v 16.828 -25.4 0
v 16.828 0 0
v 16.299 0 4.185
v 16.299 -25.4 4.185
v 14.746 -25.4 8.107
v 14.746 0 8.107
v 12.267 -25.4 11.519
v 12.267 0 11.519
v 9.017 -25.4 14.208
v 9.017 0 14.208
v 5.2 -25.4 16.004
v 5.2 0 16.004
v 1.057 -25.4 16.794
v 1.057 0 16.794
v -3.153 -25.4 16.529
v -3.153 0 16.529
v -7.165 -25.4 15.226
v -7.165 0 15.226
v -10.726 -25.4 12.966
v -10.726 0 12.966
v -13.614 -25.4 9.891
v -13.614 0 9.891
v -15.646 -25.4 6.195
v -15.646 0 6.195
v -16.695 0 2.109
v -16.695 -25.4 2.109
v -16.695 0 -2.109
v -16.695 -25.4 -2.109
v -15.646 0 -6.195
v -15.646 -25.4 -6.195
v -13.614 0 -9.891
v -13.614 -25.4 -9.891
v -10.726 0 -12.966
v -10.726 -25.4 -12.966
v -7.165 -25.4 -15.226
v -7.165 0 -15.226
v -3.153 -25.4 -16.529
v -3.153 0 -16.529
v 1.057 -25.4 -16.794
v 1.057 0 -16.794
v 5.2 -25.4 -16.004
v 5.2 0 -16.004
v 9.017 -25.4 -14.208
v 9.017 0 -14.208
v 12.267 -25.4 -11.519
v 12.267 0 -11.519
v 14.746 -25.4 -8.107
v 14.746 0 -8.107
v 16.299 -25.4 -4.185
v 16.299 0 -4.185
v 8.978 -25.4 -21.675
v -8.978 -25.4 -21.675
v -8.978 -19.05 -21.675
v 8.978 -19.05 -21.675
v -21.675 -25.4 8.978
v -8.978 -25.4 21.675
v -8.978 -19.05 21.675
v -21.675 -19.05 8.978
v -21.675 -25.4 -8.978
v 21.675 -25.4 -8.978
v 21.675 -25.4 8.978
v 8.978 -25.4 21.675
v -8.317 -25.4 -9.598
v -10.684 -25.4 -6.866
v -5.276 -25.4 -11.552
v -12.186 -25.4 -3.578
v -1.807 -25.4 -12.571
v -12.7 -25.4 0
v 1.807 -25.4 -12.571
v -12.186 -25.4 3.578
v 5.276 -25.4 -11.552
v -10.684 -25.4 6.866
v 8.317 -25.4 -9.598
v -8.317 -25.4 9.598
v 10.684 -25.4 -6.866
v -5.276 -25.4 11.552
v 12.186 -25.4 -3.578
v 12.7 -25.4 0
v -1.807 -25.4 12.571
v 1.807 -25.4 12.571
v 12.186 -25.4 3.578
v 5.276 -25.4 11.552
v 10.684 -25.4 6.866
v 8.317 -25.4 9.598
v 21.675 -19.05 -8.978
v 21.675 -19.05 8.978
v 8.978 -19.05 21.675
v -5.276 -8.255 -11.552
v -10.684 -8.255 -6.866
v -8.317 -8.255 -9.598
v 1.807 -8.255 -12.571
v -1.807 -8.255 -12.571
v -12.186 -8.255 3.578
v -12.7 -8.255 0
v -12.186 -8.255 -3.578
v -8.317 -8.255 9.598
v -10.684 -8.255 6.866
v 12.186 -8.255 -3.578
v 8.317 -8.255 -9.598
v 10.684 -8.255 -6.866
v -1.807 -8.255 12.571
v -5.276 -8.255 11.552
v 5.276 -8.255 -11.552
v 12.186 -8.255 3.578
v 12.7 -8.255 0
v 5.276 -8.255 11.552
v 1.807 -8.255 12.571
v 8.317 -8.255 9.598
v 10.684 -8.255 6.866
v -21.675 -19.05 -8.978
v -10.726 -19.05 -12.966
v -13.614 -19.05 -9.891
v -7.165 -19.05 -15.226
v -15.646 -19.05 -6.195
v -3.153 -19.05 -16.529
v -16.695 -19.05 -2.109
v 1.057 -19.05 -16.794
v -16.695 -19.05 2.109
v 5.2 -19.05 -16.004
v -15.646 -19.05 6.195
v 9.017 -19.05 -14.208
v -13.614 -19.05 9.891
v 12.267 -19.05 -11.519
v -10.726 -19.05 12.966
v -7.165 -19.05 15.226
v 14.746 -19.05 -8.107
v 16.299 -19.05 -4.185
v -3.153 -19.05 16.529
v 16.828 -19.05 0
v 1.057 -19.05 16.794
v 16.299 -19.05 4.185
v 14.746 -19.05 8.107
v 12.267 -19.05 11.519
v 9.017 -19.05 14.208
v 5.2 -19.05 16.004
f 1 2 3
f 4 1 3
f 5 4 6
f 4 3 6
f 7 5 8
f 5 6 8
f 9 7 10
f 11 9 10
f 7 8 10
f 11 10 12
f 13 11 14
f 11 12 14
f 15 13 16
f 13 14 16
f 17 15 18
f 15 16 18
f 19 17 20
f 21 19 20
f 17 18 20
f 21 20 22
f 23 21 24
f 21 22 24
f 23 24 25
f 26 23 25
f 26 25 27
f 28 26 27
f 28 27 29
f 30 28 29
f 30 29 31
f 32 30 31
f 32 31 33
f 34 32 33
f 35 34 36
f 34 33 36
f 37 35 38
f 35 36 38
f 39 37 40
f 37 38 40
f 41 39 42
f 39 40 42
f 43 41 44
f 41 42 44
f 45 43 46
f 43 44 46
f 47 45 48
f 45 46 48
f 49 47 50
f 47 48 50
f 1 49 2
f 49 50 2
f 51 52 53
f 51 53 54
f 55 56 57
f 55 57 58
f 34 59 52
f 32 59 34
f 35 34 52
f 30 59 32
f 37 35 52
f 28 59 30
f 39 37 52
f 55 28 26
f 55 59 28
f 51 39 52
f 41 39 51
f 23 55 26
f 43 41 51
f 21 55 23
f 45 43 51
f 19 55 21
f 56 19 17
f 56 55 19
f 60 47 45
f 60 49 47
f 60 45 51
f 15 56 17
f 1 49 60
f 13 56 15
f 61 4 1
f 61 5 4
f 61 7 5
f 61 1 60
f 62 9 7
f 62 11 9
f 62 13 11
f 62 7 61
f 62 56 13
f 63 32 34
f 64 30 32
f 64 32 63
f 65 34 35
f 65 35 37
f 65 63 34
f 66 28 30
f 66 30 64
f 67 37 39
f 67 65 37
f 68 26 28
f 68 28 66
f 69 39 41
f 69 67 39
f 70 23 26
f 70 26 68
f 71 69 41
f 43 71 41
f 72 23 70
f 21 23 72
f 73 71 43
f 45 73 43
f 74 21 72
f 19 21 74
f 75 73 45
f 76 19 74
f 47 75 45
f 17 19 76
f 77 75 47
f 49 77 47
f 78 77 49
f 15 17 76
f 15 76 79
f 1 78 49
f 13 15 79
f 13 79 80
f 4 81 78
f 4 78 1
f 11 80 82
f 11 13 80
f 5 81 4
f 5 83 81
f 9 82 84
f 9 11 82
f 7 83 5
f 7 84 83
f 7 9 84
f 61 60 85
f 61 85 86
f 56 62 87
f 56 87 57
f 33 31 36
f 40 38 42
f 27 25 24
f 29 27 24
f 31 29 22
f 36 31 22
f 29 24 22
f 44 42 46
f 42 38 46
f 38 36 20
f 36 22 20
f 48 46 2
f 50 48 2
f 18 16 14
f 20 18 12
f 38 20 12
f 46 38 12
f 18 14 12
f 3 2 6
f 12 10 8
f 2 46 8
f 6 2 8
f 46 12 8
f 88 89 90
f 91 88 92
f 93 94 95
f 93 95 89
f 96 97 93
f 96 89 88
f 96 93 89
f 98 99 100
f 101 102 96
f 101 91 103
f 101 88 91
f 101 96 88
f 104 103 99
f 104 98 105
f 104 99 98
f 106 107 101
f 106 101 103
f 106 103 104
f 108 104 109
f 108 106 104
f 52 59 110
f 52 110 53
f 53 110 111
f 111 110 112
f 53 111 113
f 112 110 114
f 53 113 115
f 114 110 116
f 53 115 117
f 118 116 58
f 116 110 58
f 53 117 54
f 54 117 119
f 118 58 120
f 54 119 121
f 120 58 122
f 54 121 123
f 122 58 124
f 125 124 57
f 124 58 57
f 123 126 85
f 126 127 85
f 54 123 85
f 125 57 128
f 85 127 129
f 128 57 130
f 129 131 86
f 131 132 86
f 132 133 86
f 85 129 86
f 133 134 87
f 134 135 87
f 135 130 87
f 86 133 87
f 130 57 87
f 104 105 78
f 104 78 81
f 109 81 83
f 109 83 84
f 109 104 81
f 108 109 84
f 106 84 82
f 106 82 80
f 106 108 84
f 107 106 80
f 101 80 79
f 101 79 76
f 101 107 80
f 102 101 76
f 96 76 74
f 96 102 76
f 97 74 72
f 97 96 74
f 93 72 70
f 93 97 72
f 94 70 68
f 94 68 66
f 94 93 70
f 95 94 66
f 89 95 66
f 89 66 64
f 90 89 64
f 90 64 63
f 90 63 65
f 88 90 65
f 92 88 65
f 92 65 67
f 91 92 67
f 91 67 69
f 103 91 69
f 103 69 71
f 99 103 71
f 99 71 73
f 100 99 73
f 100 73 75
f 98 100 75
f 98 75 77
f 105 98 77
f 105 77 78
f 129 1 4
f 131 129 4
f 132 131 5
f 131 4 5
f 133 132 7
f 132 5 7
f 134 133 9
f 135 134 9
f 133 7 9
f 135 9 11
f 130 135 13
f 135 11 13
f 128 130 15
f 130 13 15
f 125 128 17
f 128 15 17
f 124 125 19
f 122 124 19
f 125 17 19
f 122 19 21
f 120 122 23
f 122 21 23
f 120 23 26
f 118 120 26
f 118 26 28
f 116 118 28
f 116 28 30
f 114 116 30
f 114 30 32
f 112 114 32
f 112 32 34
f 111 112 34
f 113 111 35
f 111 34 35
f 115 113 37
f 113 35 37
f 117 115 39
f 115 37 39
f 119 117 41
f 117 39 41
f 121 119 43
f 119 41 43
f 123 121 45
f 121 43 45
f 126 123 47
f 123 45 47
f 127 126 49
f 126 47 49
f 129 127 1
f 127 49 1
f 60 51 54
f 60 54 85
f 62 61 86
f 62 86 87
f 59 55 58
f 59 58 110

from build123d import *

# Parameters (mm, degrees)
F0_R     = 12.7
F1_DEPTH = 8.255
F0_R_2   = 16.8275
F2_DEPTH = 25.4
F3_R     = 16.8275
F4_DEPTH = 6.35


with BuildPart() as f1:
    # F0 (on Front) → F1 (new body)
    with BuildSketch(Plane.XZ):
        Circle(F0_R)
    extrude(amount=F1_DEPTH)

    # F0 (on Front) → F2 (join)
    with BuildSketch(Plane.XZ):
        Circle(F0_R_2)
        Circle(F0_R, mode=Mode.SUBTRACT)
    extrude(amount=F2_DEPTH)


with BuildPart() as f4:
    # F3 (on face) → F4 (new body)
    with BuildSketch(Plane.XZ.offset(25.4)):
        Polygon((-8.978167, -21.675211), (8.978167, -21.675211), (21.675211, -8.978167), (21.675211, 8.978167), (8.978167, 21.675211), (-8.978167, 21.675211), (-21.675211, 8.978167), (-21.675211, -8.978167), align=None)
        Circle(F3_R, mode=Mode.SUBTRACT)
    extrude(amount=-F4_DEPTH)


solid = Compound([f1.part, f4.part])
